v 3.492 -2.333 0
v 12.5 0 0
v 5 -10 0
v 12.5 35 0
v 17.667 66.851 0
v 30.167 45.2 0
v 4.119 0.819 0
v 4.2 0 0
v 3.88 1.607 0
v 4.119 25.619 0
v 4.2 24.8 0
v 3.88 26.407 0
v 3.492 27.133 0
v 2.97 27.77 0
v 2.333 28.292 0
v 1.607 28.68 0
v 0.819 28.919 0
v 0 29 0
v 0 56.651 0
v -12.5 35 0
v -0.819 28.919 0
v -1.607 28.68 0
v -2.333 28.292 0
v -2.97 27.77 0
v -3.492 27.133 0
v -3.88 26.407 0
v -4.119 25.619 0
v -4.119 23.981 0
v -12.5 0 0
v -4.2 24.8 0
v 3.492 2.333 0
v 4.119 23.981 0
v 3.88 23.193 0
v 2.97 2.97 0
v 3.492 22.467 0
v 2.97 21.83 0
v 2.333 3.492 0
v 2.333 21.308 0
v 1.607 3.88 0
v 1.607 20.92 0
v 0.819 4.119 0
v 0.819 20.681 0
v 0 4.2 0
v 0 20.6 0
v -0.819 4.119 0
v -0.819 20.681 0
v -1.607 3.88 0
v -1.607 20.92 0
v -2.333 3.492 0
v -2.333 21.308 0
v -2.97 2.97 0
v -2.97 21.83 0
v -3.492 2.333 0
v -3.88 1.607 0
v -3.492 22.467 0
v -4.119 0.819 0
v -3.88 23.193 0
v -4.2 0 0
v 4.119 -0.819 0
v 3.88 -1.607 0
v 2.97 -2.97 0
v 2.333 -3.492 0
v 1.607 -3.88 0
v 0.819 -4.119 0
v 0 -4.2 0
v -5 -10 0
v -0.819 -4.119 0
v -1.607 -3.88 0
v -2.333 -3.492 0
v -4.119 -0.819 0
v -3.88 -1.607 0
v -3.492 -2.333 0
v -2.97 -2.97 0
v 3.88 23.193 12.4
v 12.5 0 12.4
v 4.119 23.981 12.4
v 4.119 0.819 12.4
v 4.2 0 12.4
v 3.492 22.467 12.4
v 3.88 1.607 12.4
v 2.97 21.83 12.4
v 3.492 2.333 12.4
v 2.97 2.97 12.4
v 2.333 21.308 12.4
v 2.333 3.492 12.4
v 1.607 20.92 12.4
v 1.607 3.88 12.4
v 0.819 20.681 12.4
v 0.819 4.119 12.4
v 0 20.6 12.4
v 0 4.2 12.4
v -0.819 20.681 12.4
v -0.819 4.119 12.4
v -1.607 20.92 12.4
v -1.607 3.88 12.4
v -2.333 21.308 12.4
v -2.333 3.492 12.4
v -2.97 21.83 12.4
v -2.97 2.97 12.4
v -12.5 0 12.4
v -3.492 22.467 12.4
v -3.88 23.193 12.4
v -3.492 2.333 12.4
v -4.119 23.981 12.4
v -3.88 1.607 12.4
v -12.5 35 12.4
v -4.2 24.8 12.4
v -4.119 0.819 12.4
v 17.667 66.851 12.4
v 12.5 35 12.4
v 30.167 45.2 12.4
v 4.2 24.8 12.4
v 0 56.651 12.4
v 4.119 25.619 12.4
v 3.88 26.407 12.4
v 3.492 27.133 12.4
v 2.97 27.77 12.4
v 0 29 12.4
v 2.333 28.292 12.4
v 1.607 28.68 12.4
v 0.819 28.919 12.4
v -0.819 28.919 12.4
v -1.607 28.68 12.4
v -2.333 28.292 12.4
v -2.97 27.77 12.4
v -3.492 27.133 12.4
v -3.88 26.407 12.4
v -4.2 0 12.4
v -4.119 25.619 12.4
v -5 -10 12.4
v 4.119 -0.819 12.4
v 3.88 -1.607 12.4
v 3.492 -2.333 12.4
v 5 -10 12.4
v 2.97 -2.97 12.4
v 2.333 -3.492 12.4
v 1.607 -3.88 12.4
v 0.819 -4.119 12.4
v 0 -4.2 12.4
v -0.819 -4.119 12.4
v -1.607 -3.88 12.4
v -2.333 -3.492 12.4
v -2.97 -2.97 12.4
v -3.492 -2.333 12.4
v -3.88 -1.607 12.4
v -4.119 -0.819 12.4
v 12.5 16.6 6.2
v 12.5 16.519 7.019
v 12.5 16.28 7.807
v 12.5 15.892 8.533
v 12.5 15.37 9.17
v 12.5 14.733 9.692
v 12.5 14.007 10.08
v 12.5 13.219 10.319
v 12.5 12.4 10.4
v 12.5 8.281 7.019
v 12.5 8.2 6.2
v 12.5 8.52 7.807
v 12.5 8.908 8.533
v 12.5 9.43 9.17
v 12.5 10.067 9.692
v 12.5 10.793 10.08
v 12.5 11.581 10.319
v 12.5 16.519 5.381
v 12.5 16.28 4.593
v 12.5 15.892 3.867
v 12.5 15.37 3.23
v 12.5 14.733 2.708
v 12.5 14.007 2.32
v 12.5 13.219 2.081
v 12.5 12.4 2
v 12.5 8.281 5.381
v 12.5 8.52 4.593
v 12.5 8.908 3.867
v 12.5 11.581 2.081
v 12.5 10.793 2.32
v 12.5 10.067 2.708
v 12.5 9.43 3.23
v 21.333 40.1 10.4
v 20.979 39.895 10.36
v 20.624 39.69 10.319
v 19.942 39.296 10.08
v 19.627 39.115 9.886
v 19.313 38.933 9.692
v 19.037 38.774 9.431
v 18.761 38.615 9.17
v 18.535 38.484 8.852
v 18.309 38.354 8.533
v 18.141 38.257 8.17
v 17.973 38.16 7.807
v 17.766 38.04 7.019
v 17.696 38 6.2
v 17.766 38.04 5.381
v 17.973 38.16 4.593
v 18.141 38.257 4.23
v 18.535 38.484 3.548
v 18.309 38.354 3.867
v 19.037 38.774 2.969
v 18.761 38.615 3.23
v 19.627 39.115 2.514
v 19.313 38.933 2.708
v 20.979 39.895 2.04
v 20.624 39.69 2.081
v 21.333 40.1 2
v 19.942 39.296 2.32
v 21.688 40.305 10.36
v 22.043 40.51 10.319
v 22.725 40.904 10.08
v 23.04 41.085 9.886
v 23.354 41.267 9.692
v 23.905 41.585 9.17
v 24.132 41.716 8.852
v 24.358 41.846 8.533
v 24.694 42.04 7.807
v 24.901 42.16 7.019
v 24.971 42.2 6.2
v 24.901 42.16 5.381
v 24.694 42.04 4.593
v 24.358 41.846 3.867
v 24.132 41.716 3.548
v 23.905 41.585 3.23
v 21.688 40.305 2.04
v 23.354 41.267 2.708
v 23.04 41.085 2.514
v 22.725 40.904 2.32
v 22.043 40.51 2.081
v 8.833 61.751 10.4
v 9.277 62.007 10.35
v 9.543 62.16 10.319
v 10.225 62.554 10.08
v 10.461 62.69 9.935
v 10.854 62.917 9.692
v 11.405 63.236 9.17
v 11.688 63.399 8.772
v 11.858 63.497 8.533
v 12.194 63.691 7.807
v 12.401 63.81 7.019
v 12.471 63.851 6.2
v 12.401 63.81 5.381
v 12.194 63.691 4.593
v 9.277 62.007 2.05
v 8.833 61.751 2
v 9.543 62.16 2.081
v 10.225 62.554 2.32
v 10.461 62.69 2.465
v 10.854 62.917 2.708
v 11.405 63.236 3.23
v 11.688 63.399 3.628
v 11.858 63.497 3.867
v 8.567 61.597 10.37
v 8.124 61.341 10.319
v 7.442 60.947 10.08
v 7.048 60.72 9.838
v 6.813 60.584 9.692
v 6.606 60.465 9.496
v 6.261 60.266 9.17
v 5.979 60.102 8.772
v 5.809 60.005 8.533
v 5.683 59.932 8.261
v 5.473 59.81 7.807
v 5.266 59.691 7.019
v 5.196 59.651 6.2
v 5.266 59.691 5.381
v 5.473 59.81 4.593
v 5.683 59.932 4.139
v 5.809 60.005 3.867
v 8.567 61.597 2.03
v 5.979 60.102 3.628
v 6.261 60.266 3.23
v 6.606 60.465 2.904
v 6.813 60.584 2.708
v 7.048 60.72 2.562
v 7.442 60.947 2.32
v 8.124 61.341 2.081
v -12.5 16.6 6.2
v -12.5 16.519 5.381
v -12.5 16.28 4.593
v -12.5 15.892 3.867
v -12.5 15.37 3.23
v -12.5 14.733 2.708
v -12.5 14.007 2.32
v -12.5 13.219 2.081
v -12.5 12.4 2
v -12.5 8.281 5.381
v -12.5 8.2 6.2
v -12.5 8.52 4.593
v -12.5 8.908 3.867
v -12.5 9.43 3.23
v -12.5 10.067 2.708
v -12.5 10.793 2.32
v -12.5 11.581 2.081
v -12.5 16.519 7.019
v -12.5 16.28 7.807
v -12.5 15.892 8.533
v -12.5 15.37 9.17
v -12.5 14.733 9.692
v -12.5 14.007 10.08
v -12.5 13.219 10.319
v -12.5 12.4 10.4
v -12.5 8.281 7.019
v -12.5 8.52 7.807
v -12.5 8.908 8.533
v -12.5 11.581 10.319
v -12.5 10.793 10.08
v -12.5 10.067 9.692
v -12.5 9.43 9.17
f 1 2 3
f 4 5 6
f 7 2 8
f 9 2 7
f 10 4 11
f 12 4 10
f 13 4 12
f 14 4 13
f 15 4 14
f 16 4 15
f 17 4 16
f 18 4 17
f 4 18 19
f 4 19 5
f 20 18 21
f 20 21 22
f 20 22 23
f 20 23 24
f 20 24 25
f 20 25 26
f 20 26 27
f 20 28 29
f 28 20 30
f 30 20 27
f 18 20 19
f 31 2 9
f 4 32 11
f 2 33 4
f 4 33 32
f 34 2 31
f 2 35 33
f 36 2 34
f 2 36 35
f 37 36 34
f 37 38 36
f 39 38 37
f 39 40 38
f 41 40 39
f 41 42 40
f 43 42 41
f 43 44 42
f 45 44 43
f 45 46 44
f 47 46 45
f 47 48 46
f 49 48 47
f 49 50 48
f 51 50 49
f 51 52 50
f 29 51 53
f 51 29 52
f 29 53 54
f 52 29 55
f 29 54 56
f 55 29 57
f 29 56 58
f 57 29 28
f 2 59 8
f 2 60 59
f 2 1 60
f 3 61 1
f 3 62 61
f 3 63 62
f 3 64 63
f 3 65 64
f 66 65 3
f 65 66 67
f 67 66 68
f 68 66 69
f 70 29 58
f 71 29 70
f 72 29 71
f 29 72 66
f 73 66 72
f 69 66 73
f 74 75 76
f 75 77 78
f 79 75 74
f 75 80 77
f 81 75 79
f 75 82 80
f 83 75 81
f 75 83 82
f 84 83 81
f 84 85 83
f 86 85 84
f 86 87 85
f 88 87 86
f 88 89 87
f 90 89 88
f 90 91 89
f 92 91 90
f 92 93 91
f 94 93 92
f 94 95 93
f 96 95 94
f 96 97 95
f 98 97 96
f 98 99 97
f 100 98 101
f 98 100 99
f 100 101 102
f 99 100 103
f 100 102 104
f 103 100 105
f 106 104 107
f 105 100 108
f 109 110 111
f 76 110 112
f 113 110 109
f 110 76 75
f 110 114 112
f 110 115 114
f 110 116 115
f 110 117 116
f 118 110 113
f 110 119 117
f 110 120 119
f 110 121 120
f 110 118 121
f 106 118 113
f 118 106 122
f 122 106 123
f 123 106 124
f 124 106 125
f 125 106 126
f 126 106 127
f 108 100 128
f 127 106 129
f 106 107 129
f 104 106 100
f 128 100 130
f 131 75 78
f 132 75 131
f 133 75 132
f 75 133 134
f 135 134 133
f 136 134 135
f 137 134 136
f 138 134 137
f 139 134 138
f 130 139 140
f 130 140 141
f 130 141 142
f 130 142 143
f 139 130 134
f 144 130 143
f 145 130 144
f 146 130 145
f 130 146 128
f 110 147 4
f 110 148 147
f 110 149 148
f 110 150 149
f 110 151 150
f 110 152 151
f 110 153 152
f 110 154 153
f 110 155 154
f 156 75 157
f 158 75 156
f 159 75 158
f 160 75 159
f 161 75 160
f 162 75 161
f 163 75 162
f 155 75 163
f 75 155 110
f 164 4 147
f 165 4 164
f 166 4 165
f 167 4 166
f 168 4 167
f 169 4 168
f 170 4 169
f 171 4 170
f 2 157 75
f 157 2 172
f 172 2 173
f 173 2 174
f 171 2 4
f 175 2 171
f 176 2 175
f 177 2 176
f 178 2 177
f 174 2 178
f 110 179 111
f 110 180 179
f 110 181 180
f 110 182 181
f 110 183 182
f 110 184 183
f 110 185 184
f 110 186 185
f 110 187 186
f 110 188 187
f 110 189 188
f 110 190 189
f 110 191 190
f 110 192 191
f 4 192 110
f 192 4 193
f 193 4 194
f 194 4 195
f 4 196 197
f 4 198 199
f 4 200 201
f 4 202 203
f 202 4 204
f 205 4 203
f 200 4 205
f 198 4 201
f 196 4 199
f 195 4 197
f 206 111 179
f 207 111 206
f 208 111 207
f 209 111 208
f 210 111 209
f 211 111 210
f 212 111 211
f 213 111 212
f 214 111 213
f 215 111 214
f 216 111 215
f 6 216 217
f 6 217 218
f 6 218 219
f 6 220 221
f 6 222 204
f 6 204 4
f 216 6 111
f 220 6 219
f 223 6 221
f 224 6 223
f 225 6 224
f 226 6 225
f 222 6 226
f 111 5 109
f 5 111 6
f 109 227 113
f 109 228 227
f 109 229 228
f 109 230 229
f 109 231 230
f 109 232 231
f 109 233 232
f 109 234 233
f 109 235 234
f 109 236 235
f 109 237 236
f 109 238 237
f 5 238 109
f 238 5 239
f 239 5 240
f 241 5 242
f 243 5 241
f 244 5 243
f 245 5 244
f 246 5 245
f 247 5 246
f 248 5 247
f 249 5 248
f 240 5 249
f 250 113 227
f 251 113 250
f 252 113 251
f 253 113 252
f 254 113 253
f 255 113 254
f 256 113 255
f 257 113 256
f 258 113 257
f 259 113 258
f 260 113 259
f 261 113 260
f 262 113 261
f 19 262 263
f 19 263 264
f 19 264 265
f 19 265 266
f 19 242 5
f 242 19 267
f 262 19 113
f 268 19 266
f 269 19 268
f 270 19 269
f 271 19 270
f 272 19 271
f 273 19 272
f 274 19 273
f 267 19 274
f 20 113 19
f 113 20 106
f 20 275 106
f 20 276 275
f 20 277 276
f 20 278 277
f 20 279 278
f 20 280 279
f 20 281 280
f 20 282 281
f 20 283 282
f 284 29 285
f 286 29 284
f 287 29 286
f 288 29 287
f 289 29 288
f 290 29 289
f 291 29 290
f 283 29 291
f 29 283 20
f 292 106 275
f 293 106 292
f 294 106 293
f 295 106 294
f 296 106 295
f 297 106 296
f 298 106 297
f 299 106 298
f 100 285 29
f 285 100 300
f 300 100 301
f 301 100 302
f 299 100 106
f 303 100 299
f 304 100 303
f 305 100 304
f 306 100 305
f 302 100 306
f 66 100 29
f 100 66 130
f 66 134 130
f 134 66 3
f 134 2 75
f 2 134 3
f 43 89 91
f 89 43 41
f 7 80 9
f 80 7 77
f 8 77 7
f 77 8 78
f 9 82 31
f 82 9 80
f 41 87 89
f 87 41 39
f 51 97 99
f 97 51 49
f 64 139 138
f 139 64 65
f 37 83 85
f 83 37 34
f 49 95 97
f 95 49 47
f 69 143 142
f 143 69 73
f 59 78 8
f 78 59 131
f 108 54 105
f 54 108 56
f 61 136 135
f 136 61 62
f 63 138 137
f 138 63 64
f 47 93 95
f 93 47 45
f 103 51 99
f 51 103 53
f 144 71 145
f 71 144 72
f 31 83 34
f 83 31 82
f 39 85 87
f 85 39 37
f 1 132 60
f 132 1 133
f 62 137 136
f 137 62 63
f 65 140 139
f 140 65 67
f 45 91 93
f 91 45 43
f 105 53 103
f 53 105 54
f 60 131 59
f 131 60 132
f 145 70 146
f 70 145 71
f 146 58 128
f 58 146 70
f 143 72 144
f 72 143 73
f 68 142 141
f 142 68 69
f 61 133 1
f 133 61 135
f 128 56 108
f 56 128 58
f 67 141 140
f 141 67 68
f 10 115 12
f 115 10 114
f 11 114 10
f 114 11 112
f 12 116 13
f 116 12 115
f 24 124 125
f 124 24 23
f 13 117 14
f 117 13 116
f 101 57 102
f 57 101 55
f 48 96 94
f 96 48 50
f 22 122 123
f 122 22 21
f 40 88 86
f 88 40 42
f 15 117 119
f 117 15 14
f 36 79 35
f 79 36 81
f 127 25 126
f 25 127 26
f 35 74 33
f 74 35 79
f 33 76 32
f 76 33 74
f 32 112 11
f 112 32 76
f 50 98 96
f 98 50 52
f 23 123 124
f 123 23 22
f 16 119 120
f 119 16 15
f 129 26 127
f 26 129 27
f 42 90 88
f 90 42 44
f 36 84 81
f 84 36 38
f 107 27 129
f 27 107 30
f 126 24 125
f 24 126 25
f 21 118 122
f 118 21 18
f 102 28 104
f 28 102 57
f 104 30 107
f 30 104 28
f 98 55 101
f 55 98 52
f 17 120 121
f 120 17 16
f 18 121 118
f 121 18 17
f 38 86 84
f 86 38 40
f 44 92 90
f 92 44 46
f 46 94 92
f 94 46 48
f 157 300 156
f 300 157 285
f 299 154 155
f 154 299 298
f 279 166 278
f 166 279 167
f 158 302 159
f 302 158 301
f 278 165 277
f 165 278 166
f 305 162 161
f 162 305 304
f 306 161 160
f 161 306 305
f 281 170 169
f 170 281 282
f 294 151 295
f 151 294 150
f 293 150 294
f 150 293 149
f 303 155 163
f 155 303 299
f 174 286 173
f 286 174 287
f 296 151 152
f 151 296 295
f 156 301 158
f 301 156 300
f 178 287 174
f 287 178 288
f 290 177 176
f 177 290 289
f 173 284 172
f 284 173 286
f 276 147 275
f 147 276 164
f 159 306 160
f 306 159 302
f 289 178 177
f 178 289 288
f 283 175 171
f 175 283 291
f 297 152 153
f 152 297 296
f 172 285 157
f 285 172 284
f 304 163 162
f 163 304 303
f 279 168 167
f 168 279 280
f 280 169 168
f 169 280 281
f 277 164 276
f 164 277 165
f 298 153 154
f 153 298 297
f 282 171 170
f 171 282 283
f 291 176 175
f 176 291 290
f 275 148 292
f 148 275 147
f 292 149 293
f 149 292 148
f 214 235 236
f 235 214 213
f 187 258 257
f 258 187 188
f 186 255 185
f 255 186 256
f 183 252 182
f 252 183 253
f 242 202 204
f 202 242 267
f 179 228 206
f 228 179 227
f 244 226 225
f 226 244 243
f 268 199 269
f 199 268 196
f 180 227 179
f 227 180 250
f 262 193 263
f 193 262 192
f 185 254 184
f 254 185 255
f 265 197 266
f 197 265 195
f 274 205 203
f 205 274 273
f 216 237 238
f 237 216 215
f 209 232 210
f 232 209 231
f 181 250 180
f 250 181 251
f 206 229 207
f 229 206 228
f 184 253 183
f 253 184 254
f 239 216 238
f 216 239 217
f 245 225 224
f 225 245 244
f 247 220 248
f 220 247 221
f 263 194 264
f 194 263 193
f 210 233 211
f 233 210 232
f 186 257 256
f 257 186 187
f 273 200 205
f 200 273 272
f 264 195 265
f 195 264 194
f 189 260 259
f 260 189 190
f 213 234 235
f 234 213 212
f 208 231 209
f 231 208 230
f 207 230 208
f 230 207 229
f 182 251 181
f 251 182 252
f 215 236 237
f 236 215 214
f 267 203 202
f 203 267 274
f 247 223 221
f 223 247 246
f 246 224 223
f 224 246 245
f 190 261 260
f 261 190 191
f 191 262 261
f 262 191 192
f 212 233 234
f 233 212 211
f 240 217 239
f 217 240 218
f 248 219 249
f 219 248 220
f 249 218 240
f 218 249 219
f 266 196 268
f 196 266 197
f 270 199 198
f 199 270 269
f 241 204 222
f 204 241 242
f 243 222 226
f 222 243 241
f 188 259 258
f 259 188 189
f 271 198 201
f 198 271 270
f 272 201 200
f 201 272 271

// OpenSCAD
// file: configuration.scad
// PRUSA Mendel  
// Configuration file
// GNU GPL v2
// Josef Průša
// josefprusa@me.com
// prusadjs.cz
// http://www.reprap.org/wiki/Prusa_Mendel
// http://github.com/prusajr/PrusaMendel

//include <lib/mcad/motors.scad>



// Frame Design Settings
//=================

x_belt = false; //use belt or threaded rod for x-axis movement
               //threaded rod is currently broken. Do not use it.
               //Leave this true or be prepared to do lots of drilling!
               //Also, x-carriage doesn't support this option so you'll
               //have come up with a hack to make it work if you use this
               //option.

two_top_rods = true; //Use two top rods or one?
                      //No repraps have been built with one top, so use
                      //this design at your own risk!



// Build Volume Settings
//=================

//The x,y and z printable dimensions in that order
build_volume = [100,100,100];



// Threaded Rod Settings
//=================

//the diameter of the threaded rods
threaded_rod_diameter = 8.4;

//the radius of plastic needed around each threaded rod hole
//to hold it in place
threaded_rod_horizontal_clearance = 4;

//the plastic needed above and under each threaded rod hole
threaded_rod_vertical_clearance = 2;


tear_shape = false; //Use tear shaped holes for rods? not compatable with tight_grip = true

tight_grip = true; // Use tight holes where possible so that parts will self tap when 
                   // threaded rod is drilled in. Reduces need for nuts.
                   // tight_grip = false not compatable with two_top_rods = false



// Motor Settings
//=================

//NEMA_version //Variable not yet implemented.



// Driven Dimensions [NO USER-CONFIGURABLE OPTIONS]
//=================

vert_angle = 60;



// Legacy
//=================

// DEPRECATED! M8 rod diameter. use threaded_rod_diameter
m8_diameter = threaded_rod_diameter;

// Used for $fn nut trick -> cylinder(h = 5, r=4.5, $fn=6, center=true);

//Diameter of the nuts used on the the threaded rod
nut_diameter = 16.4;
//Clearance for accessible nuts such as on frame verticies
nut_clearance = 4;

//DEPRECATED! use nut_diameter
// M8 nut diameter diameter.
m8_nut_diameter = nut_diameter;

// M4 rod/screw diameter
m4_diameter = 5;

// M4 nut diameter diameter
// Used for $fn nut trick -> cylinder(h = 5, r=4.5, $fn=6, center=true);
m4_nut_diameter = 9;

// M3 rod/screw diameter
m3_diameter = 4.4;

// M3 nut diameter diameter
// Used for $fn nut trick -> cylinder(h = 5, r=4.5, $fn=6, center=true);
m3_nut_diameter = 7;

// Bushing holders diameter
bushing_diameter = 11;
// main file
// PRUSA Mendel  
// Frame vertex
// GNU GPL v2
// Josef Průša
// josefprusa@me.com
// prusadjs.cz
// http://www.reprap.org/wiki/Prusa_Mendel
// http://github.com/prusajr/PrusaMendel

// Based on http://www.thingiverse.com/thing:2003 aka Viks footed 
// frame vertex, which is based on http://www.thingiverse.com/thing:1780 
// aka Tonokps parametric frame vertex
// Thank you guys for your great work

include <configuration.scad>

//Vertex Options
//==================

vertex_height=threaded_rod_diameter+threaded_rod_vertical_clearance*2;
FN=32;

hor_hole_seperation = threaded_rod_diameter*2+threaded_rod_horizontal_clearance*2;


//Polygon verticies
//==================
mid_l = 35;
mid_w = 25;

bot_l = 10;
bot_w = 10;


top_d = nut_diameter+nut_clearance;
top_s = (mid_w*sin(vert_angle)+top_d);
top_w = mid_w;


top_p1 = [mid_w/2+top_d*sin(vert_angle) , mid_l+top_d*cos(vert_angle)];
top_p2 = [mid_w/2+top_d*sin(vert_angle) -top_w*cos(vert_angle) , mid_l+top_d*cos(vert_angle)+top_w*sin(vert_angle)];
top_p3 = [mid_w/2-top_w*cos(vert_angle),mid_l+top_w*sin(vert_angle)];

translate ([0,0,vertex_height/2])difference() 
{
	union () {
//		dxf_linear_extrude(file = "vertex-body-fixed-qcad.dxf",height=vertex_height,center=true);
		//import_stl("vertex-body-fixed.stl");
		linear_extrude(height=vertex_height, center=true) {
			polygon(
				points=[
					[-mid_w/2, mid_l], [-mid_w/2, 0], [-bot_w/2,-bot_l],

					[bot_w/2,-bot_l], [mid_w/2,0], [mid_w/2,mid_l],
					top_p1, top_p2, top_p3
					],

				paths=[[0,1,2,3,4,5,6,7,8]]);

		}
	}
	
	// Horizontal holes
	zhole(threaded_rod_diameter);
	translate([0, hor_hole_seperation]) zhole(threaded_rod_diameter, 200); 

	// Frame triangle horizontal hole
	translate([0,hor_hole_seperation/2]) xteardrop(threaded_rod_diameter, 200);

	// Frame triangle angled hole
	translate([mid_w/2+top_d*sin(vert_angle)/2 , mid_l+top_d*cos(vert_angle)/2])  rotate(180-vert_angle) xteardrop(threaded_rod_diameter,200);

}


module zhole(diameter) cylinder(h=100,r=(diameter/2),center=true,$fn=FN); 

module xteardrop(diameter,length) rotate(a=-90,v=[0,1,0]) rotate(a=-90,v=[0,0,1]) zteardrop(diameter,length);

module yteardrop(diameter,length) rotate(a=90,v=[1,0,0]) zteardrop(diameter,length);

module zteardrop(diameter,height)
{
	rotate(a=0, v=[0,0,1]) union()
	{
		//translate([0,0,-height/2]) cube(size=[diameter/2,diameter/2,height],center=false);
		rotate(a=22.5, v=[0,0,1])cylinder(r=diameter/2, h = height,center=true,$fn=FN);
	}
}

module vertex_foot() {
	difference () {
		union () {
			cube([18,4,vertex_height],center=true);
			translate ([-5,8,0]) cube([5,18,vertex_height],center=true);
			translate ([5,9,0]) cube([5,18,vertex_height],center=true);
		}
		//translate ([0,8,0]) xteardrop(7,200);
	}
}
